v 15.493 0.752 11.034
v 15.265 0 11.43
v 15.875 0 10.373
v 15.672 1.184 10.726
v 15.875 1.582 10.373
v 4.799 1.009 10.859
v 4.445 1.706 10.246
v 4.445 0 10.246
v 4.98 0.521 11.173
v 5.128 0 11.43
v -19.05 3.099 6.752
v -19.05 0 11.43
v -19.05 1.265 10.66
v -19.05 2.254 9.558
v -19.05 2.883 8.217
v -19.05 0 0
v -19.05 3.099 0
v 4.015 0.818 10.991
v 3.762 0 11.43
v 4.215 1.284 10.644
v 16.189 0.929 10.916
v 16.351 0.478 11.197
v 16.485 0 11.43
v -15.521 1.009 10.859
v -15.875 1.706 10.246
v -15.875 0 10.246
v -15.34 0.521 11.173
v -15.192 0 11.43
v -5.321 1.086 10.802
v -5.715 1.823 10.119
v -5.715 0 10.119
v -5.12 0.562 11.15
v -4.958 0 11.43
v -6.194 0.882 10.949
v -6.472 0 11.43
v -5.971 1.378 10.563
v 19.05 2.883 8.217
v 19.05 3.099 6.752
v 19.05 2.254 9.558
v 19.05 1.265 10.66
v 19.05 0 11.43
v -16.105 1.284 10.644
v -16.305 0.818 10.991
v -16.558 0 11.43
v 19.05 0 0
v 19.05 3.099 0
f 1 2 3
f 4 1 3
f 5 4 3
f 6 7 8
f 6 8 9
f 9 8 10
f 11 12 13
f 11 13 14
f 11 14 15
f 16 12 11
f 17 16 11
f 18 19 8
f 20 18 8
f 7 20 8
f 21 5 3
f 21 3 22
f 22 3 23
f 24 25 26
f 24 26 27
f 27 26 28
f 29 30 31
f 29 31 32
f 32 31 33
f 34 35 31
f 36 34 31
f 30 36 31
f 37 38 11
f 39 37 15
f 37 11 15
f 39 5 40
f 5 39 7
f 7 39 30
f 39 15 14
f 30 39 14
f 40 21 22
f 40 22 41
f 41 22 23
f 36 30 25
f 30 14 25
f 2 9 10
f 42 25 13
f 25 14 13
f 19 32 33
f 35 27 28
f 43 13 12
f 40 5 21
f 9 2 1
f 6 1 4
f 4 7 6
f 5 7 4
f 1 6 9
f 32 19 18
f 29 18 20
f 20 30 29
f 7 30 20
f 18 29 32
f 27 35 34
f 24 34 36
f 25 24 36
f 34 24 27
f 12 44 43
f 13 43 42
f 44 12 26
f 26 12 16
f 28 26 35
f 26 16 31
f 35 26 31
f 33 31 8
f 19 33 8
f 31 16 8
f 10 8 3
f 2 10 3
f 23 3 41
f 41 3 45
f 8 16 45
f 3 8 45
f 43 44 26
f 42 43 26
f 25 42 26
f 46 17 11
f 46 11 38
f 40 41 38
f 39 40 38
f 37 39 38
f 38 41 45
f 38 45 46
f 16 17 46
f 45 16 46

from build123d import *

# Parameters (mm, degrees)
F0_W        = 38.1
F0_H        = 3.0988
F1_DEPTH    = 11.43
F3_T1_DEPTH = 61.4886973558
F4_DEPTH    = 25.4


# Not quite as in the source:
# - a fillet or chamfer that OpenCascade refuses, or shapes differently, is made with other operations: its cross-section is extruded or revolved along the edge and cut away or added


with BuildPart() as f1:
    # F0 (on Top) → F1 (new body)
    with BuildSketch(Plane.XY):
        with Locations((0, 1.5494)):
            Rectangle(F0_W, F0_H)
    extrude(amount=F1_DEPTH)

    # F3: fillet of radius 5.08 on 1 edges, made by hand

    # F3_s2 → F3_t1 (cut)
    with BuildSketch(Plane.YZ.offset(-30.7443486779)):
        with BuildLine():
            ThreePointArc((3.0988, 6.7522605288), (2.2538263281, 9.5577822272), (0, 11.43))
            Line((0, 11.43), (3.0988, 11.43))
            Line((3.0988, 11.43), (3.0988, 6.7522605288))
        make_face()
    extrude(amount=F3_T1_DEPTH, mode=Mode.SUBTRACT)

    # F2 (on face) → F4 (cut)
    with BuildSketch(Plane.XZ):
        Polygon((-15.875, 10.2462954744), (-15.1915878735, 11.43), (-16.5584121265, 11.43), align=None)
        Polygon((-4.9582643893, 11.43), (-6.4717356107, 11.43), (-5.715, 10.1192954744), align=None)
        Polygon((5.1284121265, 11.43), (3.7615878735, 11.43), (4.445, 10.2462954744), align=None)
        Polygon((16.4850886423, 11.43), (15.2649113577, 11.43), (15.875, 10.3732954744), align=None)
    extrude(amount=-F4_DEPTH, mode=Mode.SUBTRACT)


solid = f1.part
